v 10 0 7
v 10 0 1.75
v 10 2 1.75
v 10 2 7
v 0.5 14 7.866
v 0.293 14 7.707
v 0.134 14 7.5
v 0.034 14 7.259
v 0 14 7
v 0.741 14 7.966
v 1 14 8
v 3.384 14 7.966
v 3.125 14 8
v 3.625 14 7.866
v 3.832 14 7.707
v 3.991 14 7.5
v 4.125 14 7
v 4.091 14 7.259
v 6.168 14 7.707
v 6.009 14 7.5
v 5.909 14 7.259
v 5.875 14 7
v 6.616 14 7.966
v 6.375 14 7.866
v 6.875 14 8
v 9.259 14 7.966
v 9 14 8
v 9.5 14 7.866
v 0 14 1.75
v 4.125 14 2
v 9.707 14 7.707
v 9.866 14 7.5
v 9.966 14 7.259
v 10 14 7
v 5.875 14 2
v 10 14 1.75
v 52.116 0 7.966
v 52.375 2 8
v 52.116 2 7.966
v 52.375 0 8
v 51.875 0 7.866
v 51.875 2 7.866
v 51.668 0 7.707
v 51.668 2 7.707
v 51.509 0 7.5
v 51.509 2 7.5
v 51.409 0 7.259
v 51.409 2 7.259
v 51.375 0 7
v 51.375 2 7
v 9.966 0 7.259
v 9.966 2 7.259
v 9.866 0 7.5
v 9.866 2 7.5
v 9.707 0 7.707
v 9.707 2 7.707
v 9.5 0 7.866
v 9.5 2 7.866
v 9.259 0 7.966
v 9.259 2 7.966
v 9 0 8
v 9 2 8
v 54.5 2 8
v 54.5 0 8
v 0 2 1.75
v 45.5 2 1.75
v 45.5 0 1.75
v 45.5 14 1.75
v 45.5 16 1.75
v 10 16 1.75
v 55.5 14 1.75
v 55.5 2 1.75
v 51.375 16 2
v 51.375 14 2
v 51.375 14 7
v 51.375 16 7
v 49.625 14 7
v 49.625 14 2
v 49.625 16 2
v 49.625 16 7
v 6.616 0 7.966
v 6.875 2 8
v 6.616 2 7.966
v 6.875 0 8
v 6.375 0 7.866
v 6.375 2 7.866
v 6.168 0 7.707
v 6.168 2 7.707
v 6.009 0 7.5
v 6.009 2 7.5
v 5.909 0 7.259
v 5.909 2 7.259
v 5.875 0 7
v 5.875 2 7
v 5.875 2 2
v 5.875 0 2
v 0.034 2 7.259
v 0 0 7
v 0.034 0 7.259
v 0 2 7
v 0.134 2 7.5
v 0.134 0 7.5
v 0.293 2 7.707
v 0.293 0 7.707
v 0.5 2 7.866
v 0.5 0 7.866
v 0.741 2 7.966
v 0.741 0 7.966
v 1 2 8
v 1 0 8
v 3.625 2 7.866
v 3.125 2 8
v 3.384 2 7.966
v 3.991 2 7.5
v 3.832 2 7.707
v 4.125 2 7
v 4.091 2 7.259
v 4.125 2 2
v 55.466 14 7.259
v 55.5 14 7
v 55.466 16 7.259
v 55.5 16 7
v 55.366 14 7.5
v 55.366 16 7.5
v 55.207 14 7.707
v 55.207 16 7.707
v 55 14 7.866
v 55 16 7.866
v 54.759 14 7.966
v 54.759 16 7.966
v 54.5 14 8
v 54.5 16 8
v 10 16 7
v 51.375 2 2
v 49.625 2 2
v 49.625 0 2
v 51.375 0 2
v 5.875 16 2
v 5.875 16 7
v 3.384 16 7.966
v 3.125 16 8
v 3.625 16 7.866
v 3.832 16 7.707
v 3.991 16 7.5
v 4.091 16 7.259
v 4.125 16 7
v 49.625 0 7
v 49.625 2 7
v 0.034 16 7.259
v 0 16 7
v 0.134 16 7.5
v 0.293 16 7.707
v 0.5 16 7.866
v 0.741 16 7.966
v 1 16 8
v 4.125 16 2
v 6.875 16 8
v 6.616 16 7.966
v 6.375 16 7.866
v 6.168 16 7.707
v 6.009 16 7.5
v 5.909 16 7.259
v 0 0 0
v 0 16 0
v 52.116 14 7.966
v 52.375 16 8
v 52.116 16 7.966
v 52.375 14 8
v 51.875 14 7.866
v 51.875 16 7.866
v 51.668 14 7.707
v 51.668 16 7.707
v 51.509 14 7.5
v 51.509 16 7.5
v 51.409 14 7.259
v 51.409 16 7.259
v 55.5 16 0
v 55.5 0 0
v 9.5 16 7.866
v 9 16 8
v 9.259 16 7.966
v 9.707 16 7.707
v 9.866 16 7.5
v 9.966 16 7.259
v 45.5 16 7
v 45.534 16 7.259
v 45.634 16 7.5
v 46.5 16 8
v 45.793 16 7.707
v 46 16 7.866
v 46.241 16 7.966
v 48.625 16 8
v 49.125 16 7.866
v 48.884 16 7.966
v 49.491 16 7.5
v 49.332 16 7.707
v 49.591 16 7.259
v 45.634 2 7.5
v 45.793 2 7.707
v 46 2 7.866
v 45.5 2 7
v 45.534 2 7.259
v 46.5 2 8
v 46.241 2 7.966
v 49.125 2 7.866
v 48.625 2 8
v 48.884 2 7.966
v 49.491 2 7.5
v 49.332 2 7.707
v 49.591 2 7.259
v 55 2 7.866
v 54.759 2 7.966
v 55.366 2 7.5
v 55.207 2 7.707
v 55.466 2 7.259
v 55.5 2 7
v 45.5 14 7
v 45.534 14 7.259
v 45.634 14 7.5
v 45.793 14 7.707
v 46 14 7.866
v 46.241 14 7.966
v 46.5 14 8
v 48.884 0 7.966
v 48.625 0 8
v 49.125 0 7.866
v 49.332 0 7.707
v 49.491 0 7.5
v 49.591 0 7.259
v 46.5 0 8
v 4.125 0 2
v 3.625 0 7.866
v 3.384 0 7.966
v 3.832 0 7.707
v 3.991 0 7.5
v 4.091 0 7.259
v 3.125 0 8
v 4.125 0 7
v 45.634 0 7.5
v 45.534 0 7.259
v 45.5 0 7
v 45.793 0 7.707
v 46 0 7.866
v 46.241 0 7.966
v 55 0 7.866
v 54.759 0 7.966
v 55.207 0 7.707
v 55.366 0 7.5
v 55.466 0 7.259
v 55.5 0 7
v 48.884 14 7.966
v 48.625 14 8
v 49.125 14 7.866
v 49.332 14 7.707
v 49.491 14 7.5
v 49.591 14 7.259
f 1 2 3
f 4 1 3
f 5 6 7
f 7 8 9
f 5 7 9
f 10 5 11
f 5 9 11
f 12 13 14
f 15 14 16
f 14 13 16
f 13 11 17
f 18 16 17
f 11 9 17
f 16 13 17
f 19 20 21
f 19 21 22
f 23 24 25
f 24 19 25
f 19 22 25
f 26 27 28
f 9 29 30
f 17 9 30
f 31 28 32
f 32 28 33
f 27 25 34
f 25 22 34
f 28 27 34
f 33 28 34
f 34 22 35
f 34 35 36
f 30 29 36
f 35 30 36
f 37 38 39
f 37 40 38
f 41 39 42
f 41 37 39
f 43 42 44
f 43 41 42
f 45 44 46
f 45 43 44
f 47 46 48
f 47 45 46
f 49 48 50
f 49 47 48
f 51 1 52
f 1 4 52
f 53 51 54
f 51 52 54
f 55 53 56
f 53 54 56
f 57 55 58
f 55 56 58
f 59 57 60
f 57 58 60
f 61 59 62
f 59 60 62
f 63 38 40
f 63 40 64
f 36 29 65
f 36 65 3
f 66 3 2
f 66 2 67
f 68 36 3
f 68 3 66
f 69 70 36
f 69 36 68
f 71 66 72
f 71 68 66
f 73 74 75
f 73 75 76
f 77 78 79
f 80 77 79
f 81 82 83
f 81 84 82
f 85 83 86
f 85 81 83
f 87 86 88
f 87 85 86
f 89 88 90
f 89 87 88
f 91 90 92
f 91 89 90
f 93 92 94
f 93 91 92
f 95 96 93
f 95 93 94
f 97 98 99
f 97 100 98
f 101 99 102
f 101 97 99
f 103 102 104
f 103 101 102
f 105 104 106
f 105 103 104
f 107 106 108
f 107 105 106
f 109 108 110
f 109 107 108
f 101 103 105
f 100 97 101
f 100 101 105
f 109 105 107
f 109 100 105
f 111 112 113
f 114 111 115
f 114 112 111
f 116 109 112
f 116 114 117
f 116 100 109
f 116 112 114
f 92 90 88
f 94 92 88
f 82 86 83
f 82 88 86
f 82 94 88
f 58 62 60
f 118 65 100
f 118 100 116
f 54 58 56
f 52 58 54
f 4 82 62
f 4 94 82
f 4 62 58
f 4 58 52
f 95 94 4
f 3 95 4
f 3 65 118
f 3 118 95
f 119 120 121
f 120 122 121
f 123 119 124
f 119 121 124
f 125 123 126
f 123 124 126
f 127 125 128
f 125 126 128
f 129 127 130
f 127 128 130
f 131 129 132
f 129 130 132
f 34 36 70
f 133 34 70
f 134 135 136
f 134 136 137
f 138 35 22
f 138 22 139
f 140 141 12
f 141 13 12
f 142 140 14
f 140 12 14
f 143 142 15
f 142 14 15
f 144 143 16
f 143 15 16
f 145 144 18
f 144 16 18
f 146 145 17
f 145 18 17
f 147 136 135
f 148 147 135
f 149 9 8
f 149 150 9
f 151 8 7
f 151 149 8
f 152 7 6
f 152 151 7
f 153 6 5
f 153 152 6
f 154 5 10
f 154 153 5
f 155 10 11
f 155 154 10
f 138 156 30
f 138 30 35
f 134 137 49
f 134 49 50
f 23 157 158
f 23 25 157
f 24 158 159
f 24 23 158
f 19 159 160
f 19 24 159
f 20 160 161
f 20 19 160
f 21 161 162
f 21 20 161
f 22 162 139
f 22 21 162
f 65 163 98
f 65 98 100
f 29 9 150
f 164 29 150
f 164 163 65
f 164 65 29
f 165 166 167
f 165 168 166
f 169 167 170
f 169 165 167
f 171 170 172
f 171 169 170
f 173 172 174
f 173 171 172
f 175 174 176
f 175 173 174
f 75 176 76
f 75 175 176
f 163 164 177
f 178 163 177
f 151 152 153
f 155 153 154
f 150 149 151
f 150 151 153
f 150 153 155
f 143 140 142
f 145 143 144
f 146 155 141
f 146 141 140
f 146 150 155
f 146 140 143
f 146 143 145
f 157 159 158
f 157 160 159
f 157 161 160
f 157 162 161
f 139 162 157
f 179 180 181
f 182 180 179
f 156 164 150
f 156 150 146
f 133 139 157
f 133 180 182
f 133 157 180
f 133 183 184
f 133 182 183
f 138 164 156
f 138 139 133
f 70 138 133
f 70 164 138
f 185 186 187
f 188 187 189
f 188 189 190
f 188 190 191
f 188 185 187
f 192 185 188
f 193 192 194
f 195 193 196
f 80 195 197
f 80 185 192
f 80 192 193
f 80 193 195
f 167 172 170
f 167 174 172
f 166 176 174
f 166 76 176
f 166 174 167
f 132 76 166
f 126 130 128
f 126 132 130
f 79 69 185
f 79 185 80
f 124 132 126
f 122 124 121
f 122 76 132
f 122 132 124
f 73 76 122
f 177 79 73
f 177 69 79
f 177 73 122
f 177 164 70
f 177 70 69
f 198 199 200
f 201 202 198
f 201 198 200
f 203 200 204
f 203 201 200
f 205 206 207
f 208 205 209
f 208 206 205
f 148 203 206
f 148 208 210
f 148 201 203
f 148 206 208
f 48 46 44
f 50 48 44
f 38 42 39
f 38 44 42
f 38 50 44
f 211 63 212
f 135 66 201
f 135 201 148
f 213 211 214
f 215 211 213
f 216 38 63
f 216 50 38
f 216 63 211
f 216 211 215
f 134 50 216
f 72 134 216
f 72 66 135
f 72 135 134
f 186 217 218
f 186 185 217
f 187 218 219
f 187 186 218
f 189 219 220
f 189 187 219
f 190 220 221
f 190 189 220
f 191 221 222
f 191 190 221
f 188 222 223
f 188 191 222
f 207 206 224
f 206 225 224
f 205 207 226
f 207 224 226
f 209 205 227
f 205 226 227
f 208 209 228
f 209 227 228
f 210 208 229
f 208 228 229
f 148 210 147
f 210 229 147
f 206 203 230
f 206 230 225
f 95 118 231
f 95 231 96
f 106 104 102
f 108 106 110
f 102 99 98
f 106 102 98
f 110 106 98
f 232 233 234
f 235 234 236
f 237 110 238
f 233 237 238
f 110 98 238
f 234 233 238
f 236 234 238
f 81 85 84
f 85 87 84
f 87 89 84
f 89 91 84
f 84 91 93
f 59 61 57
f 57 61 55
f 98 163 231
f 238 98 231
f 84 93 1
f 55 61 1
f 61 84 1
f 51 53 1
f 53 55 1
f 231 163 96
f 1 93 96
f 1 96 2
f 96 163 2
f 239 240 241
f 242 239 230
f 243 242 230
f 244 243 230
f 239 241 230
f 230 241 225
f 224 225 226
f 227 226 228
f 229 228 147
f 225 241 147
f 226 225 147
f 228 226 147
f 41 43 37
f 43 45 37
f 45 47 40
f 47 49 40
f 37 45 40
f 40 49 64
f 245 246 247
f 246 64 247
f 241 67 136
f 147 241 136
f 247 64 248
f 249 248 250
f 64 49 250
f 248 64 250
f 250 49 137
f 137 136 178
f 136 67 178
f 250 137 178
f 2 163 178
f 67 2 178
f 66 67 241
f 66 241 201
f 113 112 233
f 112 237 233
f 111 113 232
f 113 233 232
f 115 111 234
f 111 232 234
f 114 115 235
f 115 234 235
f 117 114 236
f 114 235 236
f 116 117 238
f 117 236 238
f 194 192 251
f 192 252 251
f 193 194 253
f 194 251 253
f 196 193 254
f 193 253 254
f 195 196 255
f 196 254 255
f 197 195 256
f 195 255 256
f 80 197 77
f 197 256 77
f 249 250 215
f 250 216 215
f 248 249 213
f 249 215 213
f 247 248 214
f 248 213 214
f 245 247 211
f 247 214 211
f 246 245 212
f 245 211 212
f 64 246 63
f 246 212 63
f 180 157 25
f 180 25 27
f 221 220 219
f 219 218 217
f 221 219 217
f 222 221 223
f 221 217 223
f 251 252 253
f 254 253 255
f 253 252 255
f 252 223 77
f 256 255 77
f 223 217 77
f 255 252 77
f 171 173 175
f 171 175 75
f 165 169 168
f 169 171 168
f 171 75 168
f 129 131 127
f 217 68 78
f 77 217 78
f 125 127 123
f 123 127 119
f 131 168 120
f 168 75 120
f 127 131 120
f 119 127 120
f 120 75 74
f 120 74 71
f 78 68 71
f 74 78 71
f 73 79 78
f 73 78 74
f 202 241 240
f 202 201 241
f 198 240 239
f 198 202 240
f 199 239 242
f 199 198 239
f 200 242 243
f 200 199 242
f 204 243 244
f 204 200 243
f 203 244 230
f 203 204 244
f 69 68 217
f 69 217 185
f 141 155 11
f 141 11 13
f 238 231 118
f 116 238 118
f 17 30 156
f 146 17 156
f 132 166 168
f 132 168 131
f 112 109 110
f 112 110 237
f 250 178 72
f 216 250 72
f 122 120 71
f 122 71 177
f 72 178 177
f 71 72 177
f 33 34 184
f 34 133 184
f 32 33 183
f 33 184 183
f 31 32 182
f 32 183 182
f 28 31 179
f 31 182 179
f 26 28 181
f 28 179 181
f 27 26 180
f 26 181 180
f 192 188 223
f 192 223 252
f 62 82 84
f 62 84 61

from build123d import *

# Parameters (mm, degrees)
BOX001_W     = 1.75
BOX001_H     = 2
BOX001_DEPTH = 10
BOX_W        = 10
BOX_H        = 2
BOX_DEPTH    = 8
FILLET_R     = 1
BOX003_W     = 1.75
BOX003_H     = 2
BOX003_DEPTH = 10
BOX002_W     = 10
BOX002_H     = 2
BOX002_DEPTH = 8
FILLET001_R  = 1
BOX005_W     = 1.75
BOX005_H     = 2
BOX005_DEPTH = 10
BOX004_W     = 10
BOX004_H     = 2
BOX004_DEPTH = 8
FILLET002_R  = 1
BOX007_W     = 1.75
BOX007_H     = 2
BOX007_DEPTH = 10
BOX006_W     = 10
BOX006_H     = 2
BOX006_DEPTH = 8
FILLET003_R  = 1
BOX008_W     = 55.5
BOX008_H     = 16
BOX008_DEPTH = 1.75


with BuildPart() as cube001:
    # Box001 → Box001 (new body)
    with BuildSketch(Plane(origin=(4.125, 0, 2), x_dir=(1, 0, 0), z_dir=(0, 0, 1))):
        with Locations((0.875, 1)):
            Rectangle(BOX001_W, BOX001_H)
    extrude(amount=BOX001_DEPTH)


with BuildPart() as post01:
    # Box → Box (new body)
    with BuildSketch(Plane.XY):
        with Locations((5, 1)):
            Rectangle(BOX_W, BOX_H)
    extrude(amount=BOX_DEPTH)

    # Cut: cut Cube001
    add(cube001.part, mode=Mode.SUBTRACT)

    # Fillet
    fillet_edges = [post01.edges().sort_by_distance(p)[0] for p in [
        (0, 1, 8),
        (4.125, 1, 8),
        (10, 1, 8),
        (5.875, 1, 8),
    ]]
    fillet(fillet_edges, radius=FILLET_R)


with BuildPart() as cube003:
    # Box003 → Box003 (new body)
    with BuildSketch(Plane(origin=(4.125, 0, 2), x_dir=(1, 0, 0), z_dir=(0, 0, 1))):
        with Locations((0.875, 1)):
            Rectangle(BOX003_W, BOX003_H)
    extrude(amount=BOX003_DEPTH)


with BuildPart() as post002:
    # Box002 → Box002 (new body)
    with BuildSketch(Plane.XY):
        with Locations((5, 1)):
            Rectangle(BOX002_W, BOX002_H)
    extrude(amount=BOX002_DEPTH)

    # Cut001: cut Cube003
    add(cube003.part, mode=Mode.SUBTRACT)

    # Fillet001
    fillet001_edges = [post002.edges().sort_by_distance(p)[0] for p in [
        (0, 1, 8),
        (4.125, 1, 8),
        (10, 1, 8),
        (5.875, 1, 8),
    ]]
    fillet(fillet001_edges, radius=FILLET001_R)


with BuildPart() as post002_1:
    # Fillet001 placement: moved
    add(post002.part.moved(Location((0, 14, 0))))


with BuildPart() as cube005:
    # Box005 → Box005 (new body)
    with BuildSketch(Plane(origin=(4.125, 0, 2), x_dir=(1, 0, 0), z_dir=(0, 0, 1))):
        with Locations((0.875, 1)):
            Rectangle(BOX005_W, BOX005_H)
    extrude(amount=BOX005_DEPTH)


with BuildPart() as post003:
    # Box004 → Box004 (new body)
    with BuildSketch(Plane.XY):
        with Locations((5, 1)):
            Rectangle(BOX004_W, BOX004_H)
    extrude(amount=BOX004_DEPTH)

    # Cut002: cut Cube005
    add(cube005.part, mode=Mode.SUBTRACT)

    # Fillet002
    fillet002_edges = [post003.edges().sort_by_distance(p)[0] for p in [
        (0, 1, 8),
        (4.125, 1, 8),
        (10, 1, 8),
        (5.875, 1, 8),
    ]]
    fillet(fillet002_edges, radius=FILLET002_R)


with BuildPart() as post003_1:
    # Fillet002 placement: moved
    add(post003.part.moved(Location((45.5, 0, 0))))


with BuildPart() as cube007:
    # Box007 → Box007 (new body)
    with BuildSketch(Plane(origin=(4.125, 0, 2), x_dir=(1, 0, 0), z_dir=(0, 0, 1))):
        with Locations((0.875, 1)):
            Rectangle(BOX007_W, BOX007_H)
    extrude(amount=BOX007_DEPTH)


with BuildPart() as post004:
    # Box006 → Box006 (new body)
    with BuildSketch(Plane.XY):
        with Locations((5, 1)):
            Rectangle(BOX006_W, BOX006_H)
    extrude(amount=BOX006_DEPTH)

    # Cut003: cut Cube007
    add(cube007.part, mode=Mode.SUBTRACT)

    # Fillet003
    fillet003_edges = [post004.edges().sort_by_distance(p)[0] for p in [
        (0, 1, 8),
        (4.125, 1, 8),
        (10, 1, 8),
        (5.875, 1, 8),
    ]]
    fillet(fillet003_edges, radius=FILLET003_R)


with BuildPart() as post004_1:
    # Fillet003 placement: moved
    add(post004.part.moved(Location((45.5, 14, 0))))


with BuildPart() as axlejig:
    # Box008 → Box008 (new body)
    with BuildSketch(Plane.XY):
        with Locations((27.75, 8)):
            Rectangle(BOX008_W, BOX008_H)
    extrude(amount=BOX008_DEPTH)

    # Fusion: union post01, post002, post003, post004
    add(post01.part)
    add(post002_1.part)
    add(post003_1.part)
    add(post004_1.part)


solid = axlejig.part
